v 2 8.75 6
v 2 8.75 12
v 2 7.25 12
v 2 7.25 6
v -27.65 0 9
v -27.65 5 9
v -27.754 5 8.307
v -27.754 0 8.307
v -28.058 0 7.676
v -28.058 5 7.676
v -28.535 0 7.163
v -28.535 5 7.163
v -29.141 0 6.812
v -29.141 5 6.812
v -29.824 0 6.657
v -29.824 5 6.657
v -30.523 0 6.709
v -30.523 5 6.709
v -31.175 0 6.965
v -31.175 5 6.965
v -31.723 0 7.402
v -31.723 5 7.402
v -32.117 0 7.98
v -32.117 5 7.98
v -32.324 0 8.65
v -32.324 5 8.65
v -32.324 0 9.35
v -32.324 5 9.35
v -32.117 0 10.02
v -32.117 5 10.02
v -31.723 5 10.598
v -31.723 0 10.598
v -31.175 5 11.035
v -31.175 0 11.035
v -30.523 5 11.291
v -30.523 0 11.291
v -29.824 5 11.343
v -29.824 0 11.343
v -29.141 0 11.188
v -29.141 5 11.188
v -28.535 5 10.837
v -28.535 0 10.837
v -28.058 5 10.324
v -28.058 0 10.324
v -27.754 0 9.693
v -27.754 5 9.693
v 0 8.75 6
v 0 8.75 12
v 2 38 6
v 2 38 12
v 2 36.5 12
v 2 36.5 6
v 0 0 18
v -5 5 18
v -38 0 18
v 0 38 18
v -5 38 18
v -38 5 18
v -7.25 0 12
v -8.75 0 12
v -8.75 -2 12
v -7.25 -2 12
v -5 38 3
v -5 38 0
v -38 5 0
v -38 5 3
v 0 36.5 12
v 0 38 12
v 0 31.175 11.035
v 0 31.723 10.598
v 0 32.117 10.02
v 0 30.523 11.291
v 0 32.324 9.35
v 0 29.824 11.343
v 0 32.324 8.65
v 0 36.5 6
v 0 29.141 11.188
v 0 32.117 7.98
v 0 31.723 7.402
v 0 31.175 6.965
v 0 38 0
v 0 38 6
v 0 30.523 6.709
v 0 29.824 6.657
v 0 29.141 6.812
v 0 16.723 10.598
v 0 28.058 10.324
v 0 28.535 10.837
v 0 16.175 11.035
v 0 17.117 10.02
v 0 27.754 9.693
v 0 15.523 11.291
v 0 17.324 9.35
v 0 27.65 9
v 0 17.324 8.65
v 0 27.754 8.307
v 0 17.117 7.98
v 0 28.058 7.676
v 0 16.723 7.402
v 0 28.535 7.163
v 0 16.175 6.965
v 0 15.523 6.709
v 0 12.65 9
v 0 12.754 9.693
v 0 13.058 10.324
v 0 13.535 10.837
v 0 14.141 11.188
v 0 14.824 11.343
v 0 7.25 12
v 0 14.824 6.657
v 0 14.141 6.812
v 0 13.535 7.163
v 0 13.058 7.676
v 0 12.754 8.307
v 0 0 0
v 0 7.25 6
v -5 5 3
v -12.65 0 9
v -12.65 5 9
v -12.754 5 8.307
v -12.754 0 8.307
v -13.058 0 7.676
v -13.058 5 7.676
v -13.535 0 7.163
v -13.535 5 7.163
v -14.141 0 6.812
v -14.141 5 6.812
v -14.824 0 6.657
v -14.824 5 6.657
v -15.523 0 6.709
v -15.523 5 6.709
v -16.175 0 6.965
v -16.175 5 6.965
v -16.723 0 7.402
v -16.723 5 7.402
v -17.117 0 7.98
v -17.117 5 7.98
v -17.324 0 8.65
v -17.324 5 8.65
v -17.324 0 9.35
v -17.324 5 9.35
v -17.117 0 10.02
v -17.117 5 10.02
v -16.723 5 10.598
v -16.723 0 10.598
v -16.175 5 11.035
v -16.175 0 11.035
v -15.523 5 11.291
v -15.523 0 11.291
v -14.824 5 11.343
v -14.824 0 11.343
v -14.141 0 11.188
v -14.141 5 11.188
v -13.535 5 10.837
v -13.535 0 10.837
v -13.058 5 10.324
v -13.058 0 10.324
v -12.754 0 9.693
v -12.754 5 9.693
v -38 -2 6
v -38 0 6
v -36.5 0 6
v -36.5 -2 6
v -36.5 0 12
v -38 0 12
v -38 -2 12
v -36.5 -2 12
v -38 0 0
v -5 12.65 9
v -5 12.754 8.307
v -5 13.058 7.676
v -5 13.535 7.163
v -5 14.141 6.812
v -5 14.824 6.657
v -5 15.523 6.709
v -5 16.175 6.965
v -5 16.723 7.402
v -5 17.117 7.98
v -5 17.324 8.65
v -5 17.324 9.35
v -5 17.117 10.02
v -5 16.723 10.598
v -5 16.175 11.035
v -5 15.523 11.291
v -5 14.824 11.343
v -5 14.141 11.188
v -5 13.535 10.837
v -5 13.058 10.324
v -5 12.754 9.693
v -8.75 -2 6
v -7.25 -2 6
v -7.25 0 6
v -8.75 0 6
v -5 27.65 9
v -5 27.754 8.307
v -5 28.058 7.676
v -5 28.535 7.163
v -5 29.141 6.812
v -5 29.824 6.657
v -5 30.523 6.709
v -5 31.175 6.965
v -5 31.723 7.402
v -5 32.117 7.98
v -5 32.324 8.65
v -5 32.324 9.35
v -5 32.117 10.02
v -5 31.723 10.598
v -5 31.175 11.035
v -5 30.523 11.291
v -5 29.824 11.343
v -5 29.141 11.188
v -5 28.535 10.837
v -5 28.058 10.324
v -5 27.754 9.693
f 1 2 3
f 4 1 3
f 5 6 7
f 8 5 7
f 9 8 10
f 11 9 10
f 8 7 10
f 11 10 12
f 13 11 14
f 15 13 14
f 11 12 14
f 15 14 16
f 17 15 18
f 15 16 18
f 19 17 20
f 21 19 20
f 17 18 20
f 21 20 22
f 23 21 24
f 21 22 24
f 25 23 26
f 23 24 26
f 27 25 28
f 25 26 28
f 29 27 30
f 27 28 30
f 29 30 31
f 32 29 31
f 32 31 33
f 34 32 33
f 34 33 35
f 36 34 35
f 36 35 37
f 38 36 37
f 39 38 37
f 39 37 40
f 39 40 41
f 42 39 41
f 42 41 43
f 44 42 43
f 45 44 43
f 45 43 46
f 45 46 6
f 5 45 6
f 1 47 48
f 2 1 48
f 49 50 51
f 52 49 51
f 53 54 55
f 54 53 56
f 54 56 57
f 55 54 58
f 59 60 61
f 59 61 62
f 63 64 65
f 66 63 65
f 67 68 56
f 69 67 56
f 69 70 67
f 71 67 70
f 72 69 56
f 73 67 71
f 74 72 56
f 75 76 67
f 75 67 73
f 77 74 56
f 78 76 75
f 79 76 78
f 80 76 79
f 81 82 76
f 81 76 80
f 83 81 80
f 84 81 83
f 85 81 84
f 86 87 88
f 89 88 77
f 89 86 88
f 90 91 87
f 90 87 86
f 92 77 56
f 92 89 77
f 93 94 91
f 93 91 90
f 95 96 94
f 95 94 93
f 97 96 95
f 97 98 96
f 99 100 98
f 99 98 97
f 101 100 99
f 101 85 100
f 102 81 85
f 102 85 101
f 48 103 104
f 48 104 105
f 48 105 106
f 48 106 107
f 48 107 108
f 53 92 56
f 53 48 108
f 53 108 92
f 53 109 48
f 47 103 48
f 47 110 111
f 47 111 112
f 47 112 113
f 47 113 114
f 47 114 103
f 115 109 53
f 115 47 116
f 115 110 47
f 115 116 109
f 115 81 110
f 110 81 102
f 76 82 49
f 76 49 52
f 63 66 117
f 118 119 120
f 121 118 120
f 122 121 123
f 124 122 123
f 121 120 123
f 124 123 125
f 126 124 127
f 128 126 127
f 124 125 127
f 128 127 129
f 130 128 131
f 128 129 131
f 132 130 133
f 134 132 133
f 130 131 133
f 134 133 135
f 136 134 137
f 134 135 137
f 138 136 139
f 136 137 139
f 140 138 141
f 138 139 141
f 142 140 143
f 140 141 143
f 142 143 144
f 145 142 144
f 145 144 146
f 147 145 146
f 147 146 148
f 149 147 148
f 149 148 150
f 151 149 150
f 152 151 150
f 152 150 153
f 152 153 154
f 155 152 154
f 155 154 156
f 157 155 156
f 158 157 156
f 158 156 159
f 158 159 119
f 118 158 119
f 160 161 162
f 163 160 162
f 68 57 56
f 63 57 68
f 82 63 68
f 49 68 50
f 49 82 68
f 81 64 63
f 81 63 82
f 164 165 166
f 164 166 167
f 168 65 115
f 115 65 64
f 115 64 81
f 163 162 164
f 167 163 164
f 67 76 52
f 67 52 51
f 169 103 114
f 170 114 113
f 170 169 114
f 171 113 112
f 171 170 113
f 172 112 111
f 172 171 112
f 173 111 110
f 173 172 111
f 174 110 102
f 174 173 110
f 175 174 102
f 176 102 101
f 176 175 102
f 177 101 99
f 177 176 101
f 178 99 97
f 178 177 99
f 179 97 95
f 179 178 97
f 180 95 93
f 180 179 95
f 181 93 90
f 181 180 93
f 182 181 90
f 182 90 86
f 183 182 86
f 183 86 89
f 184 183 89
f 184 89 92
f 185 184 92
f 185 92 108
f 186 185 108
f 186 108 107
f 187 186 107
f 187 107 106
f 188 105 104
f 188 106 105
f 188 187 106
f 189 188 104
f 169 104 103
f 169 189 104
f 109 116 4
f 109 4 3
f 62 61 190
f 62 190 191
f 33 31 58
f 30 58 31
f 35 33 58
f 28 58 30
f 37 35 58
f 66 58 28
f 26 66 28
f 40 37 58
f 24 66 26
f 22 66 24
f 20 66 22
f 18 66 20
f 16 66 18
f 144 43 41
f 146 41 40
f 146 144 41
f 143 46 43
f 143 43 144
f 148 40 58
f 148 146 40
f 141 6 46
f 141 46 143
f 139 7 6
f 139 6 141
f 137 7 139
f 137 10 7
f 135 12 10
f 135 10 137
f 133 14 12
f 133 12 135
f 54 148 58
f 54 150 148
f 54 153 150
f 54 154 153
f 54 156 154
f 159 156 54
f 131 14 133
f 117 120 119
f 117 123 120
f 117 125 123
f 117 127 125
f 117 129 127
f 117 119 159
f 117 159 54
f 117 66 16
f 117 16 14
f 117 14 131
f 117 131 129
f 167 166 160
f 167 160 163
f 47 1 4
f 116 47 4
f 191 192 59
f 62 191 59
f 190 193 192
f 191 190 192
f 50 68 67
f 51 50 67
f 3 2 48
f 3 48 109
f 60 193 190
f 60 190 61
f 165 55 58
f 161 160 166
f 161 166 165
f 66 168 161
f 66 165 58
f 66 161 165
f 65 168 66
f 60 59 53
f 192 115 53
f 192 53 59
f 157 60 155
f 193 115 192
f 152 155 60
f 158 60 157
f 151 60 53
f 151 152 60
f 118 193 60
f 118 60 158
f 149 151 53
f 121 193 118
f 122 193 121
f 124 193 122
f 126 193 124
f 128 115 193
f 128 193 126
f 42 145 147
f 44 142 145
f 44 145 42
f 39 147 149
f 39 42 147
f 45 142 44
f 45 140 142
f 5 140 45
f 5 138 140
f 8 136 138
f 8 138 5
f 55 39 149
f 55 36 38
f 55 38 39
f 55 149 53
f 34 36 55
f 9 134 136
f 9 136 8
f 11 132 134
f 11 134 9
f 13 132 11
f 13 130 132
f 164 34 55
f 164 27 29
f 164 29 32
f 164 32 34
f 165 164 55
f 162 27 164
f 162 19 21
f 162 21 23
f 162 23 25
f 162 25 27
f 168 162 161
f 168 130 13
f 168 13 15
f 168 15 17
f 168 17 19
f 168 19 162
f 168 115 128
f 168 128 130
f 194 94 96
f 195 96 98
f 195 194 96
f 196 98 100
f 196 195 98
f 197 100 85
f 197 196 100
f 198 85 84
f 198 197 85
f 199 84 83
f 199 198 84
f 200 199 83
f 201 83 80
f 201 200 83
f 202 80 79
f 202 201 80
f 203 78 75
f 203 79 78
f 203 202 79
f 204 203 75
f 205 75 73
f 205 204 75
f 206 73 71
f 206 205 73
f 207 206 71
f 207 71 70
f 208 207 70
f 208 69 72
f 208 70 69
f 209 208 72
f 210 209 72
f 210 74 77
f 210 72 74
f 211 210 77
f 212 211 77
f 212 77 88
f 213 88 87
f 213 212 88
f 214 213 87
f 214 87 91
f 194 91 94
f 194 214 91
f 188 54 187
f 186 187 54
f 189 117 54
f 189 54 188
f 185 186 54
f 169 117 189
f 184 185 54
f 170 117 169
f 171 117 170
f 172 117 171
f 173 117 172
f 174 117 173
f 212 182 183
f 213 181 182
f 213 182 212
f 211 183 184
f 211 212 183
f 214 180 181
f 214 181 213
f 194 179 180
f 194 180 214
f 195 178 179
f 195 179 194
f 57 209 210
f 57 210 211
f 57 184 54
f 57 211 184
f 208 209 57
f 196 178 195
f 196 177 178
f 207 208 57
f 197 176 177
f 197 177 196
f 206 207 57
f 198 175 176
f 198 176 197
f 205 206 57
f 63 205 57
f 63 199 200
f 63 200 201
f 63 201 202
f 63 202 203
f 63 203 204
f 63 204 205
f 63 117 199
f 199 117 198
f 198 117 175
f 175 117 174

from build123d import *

# Parameters (mm, degrees)
BOSS_EXTRUDE1_DEPTH = 18
SKETCH2_R           = 2.35
CUT_EXTRUDE1_DEPTH  = 18
SKETCH4_W           = 1.5
SKETCH4_H           = 6
BOSS_EXTRUDE3_DEPTH = 2
BOSS_EXTRUDE2_DEPTH = 3


with BuildPart() as part:
    # Sketch1 → Boss-Extrude1 (new body)
    with BuildSketch(Plane.XY):
        Polygon((0, 0), (-38, 0), (-38, 5), (-5, 5), (-5, 38), (0, 38), align=None)
    extrude(amount=BOSS_EXTRUDE1_DEPTH)

    # Sketch2 → Cut-Extrude1 (cut)
    with BuildSketch(Plane(origin=(0, 5, 0), x_dir=(1, 0, 0), z_dir=(0, 1, 0))):
        with Locations((-30, -9)):
            Circle(SKETCH2_R)
        with Locations((-15, -9)):
            Circle(SKETCH2_R)
    cut_extrude1 = extrude(amount=-CUT_EXTRUDE1_DEPTH, mode=Mode.SUBTRACT)

    # Sketch4 → Boss-Extrude3 (add)
    with BuildSketch(Plane.XZ):
        with Locations((-37.25, 9)):
            Rectangle(SKETCH4_W, SKETCH4_H)
        with Locations((-8, 9)):
            Rectangle(SKETCH4_W, SKETCH4_H)
    boss_extrude3 = extrude(amount=BOSS_EXTRUDE3_DEPTH)

    # Mirror1: Cut-Extrude1, Boss-Extrude3 across plane
    add(cut_extrude1.mirror(Plane(origin=(0, 0, 0), x_dir=(0, 0, 1), z_dir=(0.707106781, 0.707106781, 0))), mode=Mode.SUBTRACT)
    add(boss_extrude3.mirror(Plane(origin=(0, 0, 0), x_dir=(0, 0, 1), z_dir=(0.707106781, 0.707106781, 0))))

    # Sketch3 → Boss-Extrude2 (add)
    with BuildSketch(Plane(origin=(0, 0, 0), x_dir=(-1, 0, 0), z_dir=(0, 0, -1))):
        Polygon((5, 38), (38, 5), (5, 5), align=None)
    extrude(amount=-BOSS_EXTRUDE2_DEPTH)


solid = part.part
